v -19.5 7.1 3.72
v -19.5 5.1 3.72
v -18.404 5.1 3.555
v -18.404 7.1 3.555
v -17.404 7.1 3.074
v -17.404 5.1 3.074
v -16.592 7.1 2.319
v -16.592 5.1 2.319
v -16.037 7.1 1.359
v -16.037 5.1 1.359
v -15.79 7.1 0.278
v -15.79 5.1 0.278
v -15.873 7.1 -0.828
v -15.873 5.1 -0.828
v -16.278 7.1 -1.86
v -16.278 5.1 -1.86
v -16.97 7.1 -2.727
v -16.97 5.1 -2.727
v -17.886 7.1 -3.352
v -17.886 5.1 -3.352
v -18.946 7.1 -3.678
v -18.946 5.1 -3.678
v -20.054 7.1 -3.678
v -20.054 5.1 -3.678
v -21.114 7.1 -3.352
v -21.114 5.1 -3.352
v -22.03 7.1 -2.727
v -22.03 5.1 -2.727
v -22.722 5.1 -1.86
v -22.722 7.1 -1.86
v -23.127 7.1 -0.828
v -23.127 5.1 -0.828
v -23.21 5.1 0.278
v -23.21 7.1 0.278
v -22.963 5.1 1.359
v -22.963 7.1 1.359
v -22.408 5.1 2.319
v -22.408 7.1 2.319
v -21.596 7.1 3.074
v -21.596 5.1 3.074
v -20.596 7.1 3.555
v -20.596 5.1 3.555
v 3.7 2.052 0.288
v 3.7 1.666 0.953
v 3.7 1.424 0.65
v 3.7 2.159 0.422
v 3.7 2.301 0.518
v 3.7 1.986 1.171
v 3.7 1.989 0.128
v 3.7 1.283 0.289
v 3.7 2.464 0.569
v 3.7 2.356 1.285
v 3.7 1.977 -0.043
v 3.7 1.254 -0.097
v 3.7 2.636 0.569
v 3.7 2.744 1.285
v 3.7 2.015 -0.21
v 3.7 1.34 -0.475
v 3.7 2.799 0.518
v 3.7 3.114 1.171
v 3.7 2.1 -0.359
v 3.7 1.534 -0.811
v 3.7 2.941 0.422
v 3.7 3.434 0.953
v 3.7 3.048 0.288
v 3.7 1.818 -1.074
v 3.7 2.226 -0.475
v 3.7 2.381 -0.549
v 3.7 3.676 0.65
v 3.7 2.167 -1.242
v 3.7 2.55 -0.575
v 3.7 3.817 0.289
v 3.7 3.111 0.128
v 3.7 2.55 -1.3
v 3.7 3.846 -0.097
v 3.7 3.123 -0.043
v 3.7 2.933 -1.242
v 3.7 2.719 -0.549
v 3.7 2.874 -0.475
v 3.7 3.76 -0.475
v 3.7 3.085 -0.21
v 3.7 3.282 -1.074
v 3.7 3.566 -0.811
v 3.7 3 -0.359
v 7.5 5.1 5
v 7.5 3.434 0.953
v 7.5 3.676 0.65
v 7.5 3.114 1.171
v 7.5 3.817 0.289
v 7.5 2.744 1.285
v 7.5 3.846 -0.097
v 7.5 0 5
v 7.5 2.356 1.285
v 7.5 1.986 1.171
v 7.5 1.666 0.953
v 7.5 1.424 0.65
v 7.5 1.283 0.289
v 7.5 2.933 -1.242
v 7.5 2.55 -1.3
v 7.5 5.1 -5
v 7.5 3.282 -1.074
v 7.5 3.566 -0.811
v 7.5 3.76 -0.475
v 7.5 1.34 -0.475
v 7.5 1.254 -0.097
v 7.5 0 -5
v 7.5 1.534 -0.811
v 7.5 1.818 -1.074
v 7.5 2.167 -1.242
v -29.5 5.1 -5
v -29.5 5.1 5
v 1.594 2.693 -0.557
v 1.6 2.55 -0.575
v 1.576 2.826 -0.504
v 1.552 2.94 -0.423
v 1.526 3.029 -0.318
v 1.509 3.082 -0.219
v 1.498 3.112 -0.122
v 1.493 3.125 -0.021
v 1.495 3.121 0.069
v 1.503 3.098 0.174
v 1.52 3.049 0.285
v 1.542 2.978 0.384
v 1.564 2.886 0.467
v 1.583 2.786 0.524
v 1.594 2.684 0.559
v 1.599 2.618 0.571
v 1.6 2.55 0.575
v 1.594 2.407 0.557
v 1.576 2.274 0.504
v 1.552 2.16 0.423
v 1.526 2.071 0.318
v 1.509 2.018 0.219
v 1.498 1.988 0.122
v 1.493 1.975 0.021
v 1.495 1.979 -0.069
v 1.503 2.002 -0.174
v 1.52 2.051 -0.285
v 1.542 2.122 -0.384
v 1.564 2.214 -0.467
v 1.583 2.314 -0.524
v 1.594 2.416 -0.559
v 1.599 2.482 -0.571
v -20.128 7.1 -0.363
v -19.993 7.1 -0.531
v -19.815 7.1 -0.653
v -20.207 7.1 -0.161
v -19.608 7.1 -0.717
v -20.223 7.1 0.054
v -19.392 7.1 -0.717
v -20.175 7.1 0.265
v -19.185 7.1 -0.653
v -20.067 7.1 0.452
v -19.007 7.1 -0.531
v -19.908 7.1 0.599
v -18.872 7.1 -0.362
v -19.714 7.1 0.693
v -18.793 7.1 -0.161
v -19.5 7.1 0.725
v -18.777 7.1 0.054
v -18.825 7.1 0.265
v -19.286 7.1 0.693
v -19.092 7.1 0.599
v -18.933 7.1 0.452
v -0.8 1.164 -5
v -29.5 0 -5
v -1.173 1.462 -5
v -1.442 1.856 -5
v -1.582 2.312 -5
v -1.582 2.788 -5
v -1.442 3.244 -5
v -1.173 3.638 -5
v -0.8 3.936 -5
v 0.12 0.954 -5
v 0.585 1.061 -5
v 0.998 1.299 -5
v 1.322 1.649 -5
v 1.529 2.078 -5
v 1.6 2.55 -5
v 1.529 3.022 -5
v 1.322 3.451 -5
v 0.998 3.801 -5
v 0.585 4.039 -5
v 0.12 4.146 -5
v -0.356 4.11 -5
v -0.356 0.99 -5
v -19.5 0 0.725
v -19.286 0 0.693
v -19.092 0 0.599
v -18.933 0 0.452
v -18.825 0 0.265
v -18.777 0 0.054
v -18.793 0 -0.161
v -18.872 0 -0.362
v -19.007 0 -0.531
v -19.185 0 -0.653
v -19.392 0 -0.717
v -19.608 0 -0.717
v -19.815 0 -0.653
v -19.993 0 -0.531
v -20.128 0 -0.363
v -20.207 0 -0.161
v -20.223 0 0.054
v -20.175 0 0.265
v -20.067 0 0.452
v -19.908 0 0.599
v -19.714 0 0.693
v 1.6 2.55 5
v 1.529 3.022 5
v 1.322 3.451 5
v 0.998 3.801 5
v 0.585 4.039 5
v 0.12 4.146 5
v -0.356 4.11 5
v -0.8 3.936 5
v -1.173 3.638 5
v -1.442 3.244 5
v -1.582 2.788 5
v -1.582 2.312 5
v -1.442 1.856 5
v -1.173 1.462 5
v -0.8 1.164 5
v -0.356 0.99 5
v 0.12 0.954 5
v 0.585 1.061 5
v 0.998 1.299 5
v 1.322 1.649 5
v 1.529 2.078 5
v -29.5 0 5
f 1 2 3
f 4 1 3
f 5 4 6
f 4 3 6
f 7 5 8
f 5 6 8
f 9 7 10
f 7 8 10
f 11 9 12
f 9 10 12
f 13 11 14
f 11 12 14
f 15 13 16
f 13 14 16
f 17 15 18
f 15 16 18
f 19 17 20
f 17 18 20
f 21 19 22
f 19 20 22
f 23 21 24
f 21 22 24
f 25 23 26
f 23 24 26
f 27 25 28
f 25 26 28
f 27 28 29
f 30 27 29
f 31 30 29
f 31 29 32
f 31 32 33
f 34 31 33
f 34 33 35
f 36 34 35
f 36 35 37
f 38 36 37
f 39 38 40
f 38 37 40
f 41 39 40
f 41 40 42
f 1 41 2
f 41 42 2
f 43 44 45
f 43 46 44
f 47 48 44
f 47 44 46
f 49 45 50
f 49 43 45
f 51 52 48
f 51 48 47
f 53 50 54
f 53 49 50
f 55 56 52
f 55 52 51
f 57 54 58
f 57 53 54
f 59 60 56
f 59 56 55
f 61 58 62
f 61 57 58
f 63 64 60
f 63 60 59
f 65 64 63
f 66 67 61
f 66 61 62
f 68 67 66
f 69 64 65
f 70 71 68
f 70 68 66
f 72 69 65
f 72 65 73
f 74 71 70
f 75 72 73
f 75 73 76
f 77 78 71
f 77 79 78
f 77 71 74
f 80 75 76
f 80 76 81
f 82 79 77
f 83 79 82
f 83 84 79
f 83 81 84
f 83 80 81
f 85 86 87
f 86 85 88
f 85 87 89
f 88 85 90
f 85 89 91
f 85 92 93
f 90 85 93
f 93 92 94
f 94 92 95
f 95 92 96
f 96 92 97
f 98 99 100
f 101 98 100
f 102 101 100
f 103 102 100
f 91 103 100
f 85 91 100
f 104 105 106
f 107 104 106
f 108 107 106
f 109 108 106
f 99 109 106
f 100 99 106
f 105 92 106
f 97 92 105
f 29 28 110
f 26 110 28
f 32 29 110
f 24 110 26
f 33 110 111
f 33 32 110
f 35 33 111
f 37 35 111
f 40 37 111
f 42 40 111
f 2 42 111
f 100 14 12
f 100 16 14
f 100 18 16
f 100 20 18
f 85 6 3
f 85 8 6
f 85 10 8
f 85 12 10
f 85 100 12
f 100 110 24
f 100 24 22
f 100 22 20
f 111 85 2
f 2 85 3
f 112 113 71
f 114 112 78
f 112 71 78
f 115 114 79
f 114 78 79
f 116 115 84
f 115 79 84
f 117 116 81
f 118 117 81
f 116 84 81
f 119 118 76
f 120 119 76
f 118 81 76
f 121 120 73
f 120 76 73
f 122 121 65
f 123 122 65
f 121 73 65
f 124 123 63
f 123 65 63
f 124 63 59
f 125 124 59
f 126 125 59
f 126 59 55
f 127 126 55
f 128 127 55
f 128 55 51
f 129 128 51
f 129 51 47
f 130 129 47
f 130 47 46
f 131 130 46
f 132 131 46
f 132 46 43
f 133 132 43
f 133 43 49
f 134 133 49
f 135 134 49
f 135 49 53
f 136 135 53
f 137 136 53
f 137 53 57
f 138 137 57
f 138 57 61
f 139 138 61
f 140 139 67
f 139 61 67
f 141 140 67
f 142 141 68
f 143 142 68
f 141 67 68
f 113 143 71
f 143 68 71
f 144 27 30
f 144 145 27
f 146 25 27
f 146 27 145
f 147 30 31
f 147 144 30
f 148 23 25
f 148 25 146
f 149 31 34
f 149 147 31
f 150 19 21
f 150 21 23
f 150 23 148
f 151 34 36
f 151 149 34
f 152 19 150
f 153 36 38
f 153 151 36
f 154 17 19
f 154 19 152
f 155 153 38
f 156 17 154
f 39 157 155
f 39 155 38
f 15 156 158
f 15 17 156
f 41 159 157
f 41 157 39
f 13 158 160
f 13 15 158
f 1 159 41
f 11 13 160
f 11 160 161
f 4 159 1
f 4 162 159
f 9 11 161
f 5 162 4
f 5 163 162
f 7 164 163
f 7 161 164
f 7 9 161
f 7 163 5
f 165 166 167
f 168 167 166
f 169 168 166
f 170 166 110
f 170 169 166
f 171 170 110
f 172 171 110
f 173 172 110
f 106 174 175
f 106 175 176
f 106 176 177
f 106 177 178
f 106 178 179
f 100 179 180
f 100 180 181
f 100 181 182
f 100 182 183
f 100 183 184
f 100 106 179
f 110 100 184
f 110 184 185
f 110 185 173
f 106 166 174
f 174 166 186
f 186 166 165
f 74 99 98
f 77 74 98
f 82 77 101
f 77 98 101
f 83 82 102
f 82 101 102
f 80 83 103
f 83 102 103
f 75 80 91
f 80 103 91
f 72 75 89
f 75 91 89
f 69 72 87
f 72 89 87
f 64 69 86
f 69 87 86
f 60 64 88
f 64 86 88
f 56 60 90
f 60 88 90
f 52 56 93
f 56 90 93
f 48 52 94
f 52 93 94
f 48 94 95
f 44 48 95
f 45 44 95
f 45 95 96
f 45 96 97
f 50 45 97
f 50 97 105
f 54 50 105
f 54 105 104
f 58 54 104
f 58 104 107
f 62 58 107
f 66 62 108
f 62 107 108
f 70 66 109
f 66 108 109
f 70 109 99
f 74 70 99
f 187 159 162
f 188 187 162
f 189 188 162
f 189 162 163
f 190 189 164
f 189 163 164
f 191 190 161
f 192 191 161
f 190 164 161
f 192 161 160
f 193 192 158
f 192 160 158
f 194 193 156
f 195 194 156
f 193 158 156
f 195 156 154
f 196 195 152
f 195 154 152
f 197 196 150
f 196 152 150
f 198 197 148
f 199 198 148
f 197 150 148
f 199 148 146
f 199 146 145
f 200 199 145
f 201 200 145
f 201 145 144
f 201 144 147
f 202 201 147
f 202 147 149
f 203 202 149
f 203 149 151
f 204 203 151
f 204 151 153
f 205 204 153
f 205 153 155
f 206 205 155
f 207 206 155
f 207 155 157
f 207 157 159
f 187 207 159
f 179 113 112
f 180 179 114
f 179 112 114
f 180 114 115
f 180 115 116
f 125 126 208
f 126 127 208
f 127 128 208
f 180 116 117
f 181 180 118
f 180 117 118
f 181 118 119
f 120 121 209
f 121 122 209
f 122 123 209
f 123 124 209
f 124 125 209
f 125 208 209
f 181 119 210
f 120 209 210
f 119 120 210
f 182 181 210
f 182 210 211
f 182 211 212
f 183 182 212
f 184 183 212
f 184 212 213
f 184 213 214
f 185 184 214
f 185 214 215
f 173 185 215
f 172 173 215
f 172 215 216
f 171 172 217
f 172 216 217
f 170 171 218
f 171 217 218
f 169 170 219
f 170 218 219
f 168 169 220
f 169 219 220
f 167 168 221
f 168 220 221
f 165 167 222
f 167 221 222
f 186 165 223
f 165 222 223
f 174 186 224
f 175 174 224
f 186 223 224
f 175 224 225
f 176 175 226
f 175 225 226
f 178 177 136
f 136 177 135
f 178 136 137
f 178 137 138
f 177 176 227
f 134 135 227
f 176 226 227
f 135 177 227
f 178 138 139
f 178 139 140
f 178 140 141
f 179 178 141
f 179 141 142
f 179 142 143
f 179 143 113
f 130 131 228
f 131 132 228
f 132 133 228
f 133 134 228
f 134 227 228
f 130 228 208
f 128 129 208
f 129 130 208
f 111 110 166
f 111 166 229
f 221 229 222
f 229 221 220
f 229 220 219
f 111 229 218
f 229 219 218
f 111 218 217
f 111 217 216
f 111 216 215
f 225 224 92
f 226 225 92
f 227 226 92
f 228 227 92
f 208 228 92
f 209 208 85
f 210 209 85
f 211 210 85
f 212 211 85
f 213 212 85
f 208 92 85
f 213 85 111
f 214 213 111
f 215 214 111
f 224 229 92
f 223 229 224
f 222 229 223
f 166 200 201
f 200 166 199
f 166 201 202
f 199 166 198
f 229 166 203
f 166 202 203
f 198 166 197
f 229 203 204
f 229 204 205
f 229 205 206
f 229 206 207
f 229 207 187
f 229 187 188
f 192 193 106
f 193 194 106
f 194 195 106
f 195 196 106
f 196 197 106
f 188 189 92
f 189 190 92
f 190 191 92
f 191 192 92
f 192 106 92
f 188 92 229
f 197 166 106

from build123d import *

# Parameters (mm, degrees)
SKETCH_1_W               = 15
SKETCH_1_H               = 10
EXTRUDE_1_DEPTH          = 5.1
SKETCH_2_R               = 1.6
CUT_EXTRUDE_1_DEPTH      = 14.500370365
SKETCH_3_R               = 1.3
CUT_EXTRUDE_2_DEPTH      = 3.8
CUT_EXTRUDE_3_REACH      = 15.283
CUT_EXTRUDE_3_END_RADIUS = 1.6
SKETCH_4_R               = 0.575
SKETCH_5_W               = 10
SKETCH_5_H               = 5.1
EXTRUDE_2_DEPTH          = 22
SKETCH_6_R               = 3.72
EXTRUDE_3_DEPTH          = 2
SKETCH_7_R               = 0.725
CUT_EXTRUDE_4_DEPTH      = 31.751585341


with BuildPart() as part:
    # 草图1 → 凸台-拉伸1 (new body)
    with BuildSketch(Plane(origin=(0, 0, 0), x_dir=(1, 0, 0), z_dir=(0, 1, 0))):
        Rectangle(SKETCH_1_W, SKETCH_1_H)
    extrude(amount=EXTRUDE_1_DEPTH)

    # 草图2 → 切除-拉伸1 (cut, through all)
    with BuildSketch(Plane.XY.offset(5)):
        with Locations((0, 2.55)):
            Circle(SKETCH_2_R)
    extrude(amount=-CUT_EXTRUDE_1_DEPTH, mode=Mode.SUBTRACT)

    # 草图3 → 切除-拉伸2 (cut)
    with BuildSketch(Plane(origin=(7.5, 0, 0), x_dir=(0, 0, -1), z_dir=(1, 0, 0))):
        with Locations((0, 2.55)):
            Circle(SKETCH_3_R)
    extrude(amount=-CUT_EXTRUDE_2_DEPTH, mode=Mode.SUBTRACT)

    # 切除-拉伸3: up to this cylinder (the profile starts outside it)
    cut_extrude_3_end = Plane(origin=(0, 2.55, 0), z_dir=(0, 0, 1)) * Cylinder(CUT_EXTRUDE_3_END_RADIUS, 34.766, mode=Mode.PRIVATE)
    # 草图4 → 切除-拉伸3 (cut, up to the surface)
    with BuildSketch(Plane(origin=(3.7, 0, 0), x_dir=(0, 0, -1), z_dir=(1, 0, 0)), mode=Mode.PRIVATE) as cut_extrude_3_sk1:
        with Locations((0, 2.55)):
            Circle(SKETCH_4_R)
    cut_extrude_3_tool1 = extrude(cut_extrude_3_sk1.sketch, amount=-CUT_EXTRUDE_3_REACH, mode=Mode.PRIVATE) - cut_extrude_3_end
    add(cut_extrude_3_tool1.solids().sort_by_distance((3.7, 2.55, 0))[0], mode=Mode.SUBTRACT)

    # 草图5 → 凸台-拉伸2 (add)
    with BuildSketch(Plane.ZY.offset(7.5)):
        with Locations((0, 2.55)):
            Rectangle(SKETCH_5_W, SKETCH_5_H)
    extrude(amount=EXTRUDE_2_DEPTH)

    # 草图6 → 凸台-拉伸3 (add)
    with BuildSketch(Plane(origin=(0, 5.1, 0), x_dir=(1, 0, 0), z_dir=(0, 1, 0))):
        with Locations(Location((-19.5, 0, 0), (0, 0, 270))):
            Circle(SKETCH_6_R)
    extrude(amount=EXTRUDE_3_DEPTH)

    # 草图7 → 切除-拉伸4 (cut, through all)
    with BuildSketch(Plane(origin=(0, 7.1, 0), x_dir=(1, 0, 0), z_dir=(0, 1, 0))):
        with Locations(Location((-19.5, 0, 0), (0, 0, 270))):
            Circle(SKETCH_7_R)
    extrude(amount=-CUT_EXTRUDE_4_DEPTH, mode=Mode.SUBTRACT)


solid = part.part
